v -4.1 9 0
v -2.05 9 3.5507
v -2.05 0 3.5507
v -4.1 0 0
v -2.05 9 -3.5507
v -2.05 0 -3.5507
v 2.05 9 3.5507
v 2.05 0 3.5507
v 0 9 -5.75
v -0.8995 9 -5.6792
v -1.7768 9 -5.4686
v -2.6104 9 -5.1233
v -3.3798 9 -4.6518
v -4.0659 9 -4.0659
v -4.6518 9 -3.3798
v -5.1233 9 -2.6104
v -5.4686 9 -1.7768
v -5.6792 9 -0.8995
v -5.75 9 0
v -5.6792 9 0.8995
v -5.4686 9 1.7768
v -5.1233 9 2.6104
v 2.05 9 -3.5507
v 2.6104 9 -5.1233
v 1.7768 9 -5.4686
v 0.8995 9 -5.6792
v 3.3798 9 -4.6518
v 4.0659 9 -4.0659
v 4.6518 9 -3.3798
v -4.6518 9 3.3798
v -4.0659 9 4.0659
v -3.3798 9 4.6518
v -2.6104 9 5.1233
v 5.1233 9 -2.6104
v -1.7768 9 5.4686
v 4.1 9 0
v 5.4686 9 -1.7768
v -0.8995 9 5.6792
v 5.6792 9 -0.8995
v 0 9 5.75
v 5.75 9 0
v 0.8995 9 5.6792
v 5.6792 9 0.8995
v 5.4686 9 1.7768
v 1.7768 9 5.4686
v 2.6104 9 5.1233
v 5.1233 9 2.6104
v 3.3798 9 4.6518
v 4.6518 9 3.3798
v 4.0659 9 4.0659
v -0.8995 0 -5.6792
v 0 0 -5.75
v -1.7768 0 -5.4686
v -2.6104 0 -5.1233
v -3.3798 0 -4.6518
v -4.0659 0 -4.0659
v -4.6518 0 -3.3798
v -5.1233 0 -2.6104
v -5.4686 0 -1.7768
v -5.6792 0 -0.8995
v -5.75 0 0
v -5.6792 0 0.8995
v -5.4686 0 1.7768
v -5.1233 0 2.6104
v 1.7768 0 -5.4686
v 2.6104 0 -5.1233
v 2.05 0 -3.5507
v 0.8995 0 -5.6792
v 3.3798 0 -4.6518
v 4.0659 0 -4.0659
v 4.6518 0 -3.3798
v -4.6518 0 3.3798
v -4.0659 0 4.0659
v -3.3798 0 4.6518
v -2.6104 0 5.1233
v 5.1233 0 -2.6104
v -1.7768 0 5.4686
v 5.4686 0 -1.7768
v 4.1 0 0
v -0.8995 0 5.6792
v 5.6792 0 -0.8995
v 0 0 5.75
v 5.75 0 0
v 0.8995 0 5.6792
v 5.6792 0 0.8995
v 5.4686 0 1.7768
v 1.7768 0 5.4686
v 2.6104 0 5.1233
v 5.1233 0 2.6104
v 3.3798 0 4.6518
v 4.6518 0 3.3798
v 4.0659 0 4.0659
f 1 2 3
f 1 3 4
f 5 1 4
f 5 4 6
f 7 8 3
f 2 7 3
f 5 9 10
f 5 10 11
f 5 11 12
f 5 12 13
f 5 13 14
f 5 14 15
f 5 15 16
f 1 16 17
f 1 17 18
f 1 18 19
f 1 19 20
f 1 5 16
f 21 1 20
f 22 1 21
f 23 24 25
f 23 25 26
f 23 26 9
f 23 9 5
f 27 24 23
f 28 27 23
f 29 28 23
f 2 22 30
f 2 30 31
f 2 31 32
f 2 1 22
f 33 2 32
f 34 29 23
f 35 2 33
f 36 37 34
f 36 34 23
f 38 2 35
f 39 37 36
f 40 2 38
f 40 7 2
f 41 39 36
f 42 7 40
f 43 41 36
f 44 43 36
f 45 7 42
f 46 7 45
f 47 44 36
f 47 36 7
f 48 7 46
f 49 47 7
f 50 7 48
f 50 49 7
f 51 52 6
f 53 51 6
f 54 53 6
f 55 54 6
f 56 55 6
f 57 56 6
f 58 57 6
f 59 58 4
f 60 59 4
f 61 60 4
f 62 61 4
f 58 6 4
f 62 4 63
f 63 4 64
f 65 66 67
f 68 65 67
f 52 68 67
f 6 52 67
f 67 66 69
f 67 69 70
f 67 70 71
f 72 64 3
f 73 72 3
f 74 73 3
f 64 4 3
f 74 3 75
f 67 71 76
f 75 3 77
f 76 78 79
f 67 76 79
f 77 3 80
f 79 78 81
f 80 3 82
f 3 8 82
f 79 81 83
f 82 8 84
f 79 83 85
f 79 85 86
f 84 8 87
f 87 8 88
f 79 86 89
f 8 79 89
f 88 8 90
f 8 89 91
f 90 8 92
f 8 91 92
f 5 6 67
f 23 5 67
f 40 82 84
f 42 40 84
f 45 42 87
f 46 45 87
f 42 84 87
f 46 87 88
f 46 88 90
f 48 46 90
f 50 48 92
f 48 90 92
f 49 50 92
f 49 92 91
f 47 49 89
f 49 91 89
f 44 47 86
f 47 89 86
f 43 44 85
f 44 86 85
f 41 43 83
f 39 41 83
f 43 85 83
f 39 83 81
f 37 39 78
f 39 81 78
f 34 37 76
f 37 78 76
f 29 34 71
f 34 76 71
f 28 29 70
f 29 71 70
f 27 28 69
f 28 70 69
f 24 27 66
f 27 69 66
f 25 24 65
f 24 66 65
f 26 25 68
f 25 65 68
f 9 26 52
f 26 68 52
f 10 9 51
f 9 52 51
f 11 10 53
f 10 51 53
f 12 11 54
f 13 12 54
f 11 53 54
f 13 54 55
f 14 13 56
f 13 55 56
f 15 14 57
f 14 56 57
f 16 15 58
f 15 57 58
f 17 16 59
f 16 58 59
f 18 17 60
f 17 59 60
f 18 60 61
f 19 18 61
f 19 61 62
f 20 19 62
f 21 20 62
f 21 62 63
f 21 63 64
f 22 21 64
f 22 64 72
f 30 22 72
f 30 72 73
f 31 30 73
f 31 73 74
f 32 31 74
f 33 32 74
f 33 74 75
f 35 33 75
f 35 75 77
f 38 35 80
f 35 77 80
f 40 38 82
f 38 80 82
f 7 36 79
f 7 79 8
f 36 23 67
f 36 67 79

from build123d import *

# Parameters (mm, degrees)
SKETCH1_R           = 5.75
SKETCH1_R_2         = 4.1
BOSS_EXTRUDE1_DEPTH = 9


with BuildPart() as part:
    # Sketch1 → Boss-Extrude1 (new body)
    with BuildSketch(Plane(origin=(0, 0, 0), x_dir=(1, 0, 0), z_dir=(0, 1, 0))):
        with Locations(Location((0, 0, 0), (0, 0, 270))):
            Circle(SKETCH1_R)
        Circle(SKETCH1_R_2, mode=Mode.SUBTRACT)
        with BuildLine():
            ThreePointArc((-2.05, -3.550704156), (0, -4.1), (2.05, -3.550704156))
            Line((2.05, -3.550704156), (-2.05, -3.550704156))
        make_face()
        with BuildLine():
            Line((4.1, 0), (2.05, -3.550704156))
            ThreePointArc((2.05, -3.550704156), (3.550704156, -2.05), (4.1, 0))
        make_face()
        with BuildLine():
            Line((2.05, 3.550704156), (4.1, 0))
            ThreePointArc((4.1, 0), (3.550704156, 2.05), (2.05, 3.550704156))
        make_face()
        with BuildLine():
            Line((-2.05, 3.550704156), (2.05, 3.550704156))
            ThreePointArc((2.05, 3.550704156), (0, 4.1), (-2.05, 3.550704156))
        make_face()
        with BuildLine():
            ThreePointArc((-2.05, 3.550704156), (-3.550704156, 2.05), (-4.1, 0))
            Line((-4.1, 0), (-2.05, 3.550704156))
        make_face()
        with BuildLine():
            ThreePointArc((-4.1, 0), (-3.550704156, -2.05), (-2.05, -3.550704156))
            Line((-2.05, -3.550704156), (-4.1, 0))
        make_face()
    extrude(amount=BOSS_EXTRUDE1_DEPTH)


solid = part.part
